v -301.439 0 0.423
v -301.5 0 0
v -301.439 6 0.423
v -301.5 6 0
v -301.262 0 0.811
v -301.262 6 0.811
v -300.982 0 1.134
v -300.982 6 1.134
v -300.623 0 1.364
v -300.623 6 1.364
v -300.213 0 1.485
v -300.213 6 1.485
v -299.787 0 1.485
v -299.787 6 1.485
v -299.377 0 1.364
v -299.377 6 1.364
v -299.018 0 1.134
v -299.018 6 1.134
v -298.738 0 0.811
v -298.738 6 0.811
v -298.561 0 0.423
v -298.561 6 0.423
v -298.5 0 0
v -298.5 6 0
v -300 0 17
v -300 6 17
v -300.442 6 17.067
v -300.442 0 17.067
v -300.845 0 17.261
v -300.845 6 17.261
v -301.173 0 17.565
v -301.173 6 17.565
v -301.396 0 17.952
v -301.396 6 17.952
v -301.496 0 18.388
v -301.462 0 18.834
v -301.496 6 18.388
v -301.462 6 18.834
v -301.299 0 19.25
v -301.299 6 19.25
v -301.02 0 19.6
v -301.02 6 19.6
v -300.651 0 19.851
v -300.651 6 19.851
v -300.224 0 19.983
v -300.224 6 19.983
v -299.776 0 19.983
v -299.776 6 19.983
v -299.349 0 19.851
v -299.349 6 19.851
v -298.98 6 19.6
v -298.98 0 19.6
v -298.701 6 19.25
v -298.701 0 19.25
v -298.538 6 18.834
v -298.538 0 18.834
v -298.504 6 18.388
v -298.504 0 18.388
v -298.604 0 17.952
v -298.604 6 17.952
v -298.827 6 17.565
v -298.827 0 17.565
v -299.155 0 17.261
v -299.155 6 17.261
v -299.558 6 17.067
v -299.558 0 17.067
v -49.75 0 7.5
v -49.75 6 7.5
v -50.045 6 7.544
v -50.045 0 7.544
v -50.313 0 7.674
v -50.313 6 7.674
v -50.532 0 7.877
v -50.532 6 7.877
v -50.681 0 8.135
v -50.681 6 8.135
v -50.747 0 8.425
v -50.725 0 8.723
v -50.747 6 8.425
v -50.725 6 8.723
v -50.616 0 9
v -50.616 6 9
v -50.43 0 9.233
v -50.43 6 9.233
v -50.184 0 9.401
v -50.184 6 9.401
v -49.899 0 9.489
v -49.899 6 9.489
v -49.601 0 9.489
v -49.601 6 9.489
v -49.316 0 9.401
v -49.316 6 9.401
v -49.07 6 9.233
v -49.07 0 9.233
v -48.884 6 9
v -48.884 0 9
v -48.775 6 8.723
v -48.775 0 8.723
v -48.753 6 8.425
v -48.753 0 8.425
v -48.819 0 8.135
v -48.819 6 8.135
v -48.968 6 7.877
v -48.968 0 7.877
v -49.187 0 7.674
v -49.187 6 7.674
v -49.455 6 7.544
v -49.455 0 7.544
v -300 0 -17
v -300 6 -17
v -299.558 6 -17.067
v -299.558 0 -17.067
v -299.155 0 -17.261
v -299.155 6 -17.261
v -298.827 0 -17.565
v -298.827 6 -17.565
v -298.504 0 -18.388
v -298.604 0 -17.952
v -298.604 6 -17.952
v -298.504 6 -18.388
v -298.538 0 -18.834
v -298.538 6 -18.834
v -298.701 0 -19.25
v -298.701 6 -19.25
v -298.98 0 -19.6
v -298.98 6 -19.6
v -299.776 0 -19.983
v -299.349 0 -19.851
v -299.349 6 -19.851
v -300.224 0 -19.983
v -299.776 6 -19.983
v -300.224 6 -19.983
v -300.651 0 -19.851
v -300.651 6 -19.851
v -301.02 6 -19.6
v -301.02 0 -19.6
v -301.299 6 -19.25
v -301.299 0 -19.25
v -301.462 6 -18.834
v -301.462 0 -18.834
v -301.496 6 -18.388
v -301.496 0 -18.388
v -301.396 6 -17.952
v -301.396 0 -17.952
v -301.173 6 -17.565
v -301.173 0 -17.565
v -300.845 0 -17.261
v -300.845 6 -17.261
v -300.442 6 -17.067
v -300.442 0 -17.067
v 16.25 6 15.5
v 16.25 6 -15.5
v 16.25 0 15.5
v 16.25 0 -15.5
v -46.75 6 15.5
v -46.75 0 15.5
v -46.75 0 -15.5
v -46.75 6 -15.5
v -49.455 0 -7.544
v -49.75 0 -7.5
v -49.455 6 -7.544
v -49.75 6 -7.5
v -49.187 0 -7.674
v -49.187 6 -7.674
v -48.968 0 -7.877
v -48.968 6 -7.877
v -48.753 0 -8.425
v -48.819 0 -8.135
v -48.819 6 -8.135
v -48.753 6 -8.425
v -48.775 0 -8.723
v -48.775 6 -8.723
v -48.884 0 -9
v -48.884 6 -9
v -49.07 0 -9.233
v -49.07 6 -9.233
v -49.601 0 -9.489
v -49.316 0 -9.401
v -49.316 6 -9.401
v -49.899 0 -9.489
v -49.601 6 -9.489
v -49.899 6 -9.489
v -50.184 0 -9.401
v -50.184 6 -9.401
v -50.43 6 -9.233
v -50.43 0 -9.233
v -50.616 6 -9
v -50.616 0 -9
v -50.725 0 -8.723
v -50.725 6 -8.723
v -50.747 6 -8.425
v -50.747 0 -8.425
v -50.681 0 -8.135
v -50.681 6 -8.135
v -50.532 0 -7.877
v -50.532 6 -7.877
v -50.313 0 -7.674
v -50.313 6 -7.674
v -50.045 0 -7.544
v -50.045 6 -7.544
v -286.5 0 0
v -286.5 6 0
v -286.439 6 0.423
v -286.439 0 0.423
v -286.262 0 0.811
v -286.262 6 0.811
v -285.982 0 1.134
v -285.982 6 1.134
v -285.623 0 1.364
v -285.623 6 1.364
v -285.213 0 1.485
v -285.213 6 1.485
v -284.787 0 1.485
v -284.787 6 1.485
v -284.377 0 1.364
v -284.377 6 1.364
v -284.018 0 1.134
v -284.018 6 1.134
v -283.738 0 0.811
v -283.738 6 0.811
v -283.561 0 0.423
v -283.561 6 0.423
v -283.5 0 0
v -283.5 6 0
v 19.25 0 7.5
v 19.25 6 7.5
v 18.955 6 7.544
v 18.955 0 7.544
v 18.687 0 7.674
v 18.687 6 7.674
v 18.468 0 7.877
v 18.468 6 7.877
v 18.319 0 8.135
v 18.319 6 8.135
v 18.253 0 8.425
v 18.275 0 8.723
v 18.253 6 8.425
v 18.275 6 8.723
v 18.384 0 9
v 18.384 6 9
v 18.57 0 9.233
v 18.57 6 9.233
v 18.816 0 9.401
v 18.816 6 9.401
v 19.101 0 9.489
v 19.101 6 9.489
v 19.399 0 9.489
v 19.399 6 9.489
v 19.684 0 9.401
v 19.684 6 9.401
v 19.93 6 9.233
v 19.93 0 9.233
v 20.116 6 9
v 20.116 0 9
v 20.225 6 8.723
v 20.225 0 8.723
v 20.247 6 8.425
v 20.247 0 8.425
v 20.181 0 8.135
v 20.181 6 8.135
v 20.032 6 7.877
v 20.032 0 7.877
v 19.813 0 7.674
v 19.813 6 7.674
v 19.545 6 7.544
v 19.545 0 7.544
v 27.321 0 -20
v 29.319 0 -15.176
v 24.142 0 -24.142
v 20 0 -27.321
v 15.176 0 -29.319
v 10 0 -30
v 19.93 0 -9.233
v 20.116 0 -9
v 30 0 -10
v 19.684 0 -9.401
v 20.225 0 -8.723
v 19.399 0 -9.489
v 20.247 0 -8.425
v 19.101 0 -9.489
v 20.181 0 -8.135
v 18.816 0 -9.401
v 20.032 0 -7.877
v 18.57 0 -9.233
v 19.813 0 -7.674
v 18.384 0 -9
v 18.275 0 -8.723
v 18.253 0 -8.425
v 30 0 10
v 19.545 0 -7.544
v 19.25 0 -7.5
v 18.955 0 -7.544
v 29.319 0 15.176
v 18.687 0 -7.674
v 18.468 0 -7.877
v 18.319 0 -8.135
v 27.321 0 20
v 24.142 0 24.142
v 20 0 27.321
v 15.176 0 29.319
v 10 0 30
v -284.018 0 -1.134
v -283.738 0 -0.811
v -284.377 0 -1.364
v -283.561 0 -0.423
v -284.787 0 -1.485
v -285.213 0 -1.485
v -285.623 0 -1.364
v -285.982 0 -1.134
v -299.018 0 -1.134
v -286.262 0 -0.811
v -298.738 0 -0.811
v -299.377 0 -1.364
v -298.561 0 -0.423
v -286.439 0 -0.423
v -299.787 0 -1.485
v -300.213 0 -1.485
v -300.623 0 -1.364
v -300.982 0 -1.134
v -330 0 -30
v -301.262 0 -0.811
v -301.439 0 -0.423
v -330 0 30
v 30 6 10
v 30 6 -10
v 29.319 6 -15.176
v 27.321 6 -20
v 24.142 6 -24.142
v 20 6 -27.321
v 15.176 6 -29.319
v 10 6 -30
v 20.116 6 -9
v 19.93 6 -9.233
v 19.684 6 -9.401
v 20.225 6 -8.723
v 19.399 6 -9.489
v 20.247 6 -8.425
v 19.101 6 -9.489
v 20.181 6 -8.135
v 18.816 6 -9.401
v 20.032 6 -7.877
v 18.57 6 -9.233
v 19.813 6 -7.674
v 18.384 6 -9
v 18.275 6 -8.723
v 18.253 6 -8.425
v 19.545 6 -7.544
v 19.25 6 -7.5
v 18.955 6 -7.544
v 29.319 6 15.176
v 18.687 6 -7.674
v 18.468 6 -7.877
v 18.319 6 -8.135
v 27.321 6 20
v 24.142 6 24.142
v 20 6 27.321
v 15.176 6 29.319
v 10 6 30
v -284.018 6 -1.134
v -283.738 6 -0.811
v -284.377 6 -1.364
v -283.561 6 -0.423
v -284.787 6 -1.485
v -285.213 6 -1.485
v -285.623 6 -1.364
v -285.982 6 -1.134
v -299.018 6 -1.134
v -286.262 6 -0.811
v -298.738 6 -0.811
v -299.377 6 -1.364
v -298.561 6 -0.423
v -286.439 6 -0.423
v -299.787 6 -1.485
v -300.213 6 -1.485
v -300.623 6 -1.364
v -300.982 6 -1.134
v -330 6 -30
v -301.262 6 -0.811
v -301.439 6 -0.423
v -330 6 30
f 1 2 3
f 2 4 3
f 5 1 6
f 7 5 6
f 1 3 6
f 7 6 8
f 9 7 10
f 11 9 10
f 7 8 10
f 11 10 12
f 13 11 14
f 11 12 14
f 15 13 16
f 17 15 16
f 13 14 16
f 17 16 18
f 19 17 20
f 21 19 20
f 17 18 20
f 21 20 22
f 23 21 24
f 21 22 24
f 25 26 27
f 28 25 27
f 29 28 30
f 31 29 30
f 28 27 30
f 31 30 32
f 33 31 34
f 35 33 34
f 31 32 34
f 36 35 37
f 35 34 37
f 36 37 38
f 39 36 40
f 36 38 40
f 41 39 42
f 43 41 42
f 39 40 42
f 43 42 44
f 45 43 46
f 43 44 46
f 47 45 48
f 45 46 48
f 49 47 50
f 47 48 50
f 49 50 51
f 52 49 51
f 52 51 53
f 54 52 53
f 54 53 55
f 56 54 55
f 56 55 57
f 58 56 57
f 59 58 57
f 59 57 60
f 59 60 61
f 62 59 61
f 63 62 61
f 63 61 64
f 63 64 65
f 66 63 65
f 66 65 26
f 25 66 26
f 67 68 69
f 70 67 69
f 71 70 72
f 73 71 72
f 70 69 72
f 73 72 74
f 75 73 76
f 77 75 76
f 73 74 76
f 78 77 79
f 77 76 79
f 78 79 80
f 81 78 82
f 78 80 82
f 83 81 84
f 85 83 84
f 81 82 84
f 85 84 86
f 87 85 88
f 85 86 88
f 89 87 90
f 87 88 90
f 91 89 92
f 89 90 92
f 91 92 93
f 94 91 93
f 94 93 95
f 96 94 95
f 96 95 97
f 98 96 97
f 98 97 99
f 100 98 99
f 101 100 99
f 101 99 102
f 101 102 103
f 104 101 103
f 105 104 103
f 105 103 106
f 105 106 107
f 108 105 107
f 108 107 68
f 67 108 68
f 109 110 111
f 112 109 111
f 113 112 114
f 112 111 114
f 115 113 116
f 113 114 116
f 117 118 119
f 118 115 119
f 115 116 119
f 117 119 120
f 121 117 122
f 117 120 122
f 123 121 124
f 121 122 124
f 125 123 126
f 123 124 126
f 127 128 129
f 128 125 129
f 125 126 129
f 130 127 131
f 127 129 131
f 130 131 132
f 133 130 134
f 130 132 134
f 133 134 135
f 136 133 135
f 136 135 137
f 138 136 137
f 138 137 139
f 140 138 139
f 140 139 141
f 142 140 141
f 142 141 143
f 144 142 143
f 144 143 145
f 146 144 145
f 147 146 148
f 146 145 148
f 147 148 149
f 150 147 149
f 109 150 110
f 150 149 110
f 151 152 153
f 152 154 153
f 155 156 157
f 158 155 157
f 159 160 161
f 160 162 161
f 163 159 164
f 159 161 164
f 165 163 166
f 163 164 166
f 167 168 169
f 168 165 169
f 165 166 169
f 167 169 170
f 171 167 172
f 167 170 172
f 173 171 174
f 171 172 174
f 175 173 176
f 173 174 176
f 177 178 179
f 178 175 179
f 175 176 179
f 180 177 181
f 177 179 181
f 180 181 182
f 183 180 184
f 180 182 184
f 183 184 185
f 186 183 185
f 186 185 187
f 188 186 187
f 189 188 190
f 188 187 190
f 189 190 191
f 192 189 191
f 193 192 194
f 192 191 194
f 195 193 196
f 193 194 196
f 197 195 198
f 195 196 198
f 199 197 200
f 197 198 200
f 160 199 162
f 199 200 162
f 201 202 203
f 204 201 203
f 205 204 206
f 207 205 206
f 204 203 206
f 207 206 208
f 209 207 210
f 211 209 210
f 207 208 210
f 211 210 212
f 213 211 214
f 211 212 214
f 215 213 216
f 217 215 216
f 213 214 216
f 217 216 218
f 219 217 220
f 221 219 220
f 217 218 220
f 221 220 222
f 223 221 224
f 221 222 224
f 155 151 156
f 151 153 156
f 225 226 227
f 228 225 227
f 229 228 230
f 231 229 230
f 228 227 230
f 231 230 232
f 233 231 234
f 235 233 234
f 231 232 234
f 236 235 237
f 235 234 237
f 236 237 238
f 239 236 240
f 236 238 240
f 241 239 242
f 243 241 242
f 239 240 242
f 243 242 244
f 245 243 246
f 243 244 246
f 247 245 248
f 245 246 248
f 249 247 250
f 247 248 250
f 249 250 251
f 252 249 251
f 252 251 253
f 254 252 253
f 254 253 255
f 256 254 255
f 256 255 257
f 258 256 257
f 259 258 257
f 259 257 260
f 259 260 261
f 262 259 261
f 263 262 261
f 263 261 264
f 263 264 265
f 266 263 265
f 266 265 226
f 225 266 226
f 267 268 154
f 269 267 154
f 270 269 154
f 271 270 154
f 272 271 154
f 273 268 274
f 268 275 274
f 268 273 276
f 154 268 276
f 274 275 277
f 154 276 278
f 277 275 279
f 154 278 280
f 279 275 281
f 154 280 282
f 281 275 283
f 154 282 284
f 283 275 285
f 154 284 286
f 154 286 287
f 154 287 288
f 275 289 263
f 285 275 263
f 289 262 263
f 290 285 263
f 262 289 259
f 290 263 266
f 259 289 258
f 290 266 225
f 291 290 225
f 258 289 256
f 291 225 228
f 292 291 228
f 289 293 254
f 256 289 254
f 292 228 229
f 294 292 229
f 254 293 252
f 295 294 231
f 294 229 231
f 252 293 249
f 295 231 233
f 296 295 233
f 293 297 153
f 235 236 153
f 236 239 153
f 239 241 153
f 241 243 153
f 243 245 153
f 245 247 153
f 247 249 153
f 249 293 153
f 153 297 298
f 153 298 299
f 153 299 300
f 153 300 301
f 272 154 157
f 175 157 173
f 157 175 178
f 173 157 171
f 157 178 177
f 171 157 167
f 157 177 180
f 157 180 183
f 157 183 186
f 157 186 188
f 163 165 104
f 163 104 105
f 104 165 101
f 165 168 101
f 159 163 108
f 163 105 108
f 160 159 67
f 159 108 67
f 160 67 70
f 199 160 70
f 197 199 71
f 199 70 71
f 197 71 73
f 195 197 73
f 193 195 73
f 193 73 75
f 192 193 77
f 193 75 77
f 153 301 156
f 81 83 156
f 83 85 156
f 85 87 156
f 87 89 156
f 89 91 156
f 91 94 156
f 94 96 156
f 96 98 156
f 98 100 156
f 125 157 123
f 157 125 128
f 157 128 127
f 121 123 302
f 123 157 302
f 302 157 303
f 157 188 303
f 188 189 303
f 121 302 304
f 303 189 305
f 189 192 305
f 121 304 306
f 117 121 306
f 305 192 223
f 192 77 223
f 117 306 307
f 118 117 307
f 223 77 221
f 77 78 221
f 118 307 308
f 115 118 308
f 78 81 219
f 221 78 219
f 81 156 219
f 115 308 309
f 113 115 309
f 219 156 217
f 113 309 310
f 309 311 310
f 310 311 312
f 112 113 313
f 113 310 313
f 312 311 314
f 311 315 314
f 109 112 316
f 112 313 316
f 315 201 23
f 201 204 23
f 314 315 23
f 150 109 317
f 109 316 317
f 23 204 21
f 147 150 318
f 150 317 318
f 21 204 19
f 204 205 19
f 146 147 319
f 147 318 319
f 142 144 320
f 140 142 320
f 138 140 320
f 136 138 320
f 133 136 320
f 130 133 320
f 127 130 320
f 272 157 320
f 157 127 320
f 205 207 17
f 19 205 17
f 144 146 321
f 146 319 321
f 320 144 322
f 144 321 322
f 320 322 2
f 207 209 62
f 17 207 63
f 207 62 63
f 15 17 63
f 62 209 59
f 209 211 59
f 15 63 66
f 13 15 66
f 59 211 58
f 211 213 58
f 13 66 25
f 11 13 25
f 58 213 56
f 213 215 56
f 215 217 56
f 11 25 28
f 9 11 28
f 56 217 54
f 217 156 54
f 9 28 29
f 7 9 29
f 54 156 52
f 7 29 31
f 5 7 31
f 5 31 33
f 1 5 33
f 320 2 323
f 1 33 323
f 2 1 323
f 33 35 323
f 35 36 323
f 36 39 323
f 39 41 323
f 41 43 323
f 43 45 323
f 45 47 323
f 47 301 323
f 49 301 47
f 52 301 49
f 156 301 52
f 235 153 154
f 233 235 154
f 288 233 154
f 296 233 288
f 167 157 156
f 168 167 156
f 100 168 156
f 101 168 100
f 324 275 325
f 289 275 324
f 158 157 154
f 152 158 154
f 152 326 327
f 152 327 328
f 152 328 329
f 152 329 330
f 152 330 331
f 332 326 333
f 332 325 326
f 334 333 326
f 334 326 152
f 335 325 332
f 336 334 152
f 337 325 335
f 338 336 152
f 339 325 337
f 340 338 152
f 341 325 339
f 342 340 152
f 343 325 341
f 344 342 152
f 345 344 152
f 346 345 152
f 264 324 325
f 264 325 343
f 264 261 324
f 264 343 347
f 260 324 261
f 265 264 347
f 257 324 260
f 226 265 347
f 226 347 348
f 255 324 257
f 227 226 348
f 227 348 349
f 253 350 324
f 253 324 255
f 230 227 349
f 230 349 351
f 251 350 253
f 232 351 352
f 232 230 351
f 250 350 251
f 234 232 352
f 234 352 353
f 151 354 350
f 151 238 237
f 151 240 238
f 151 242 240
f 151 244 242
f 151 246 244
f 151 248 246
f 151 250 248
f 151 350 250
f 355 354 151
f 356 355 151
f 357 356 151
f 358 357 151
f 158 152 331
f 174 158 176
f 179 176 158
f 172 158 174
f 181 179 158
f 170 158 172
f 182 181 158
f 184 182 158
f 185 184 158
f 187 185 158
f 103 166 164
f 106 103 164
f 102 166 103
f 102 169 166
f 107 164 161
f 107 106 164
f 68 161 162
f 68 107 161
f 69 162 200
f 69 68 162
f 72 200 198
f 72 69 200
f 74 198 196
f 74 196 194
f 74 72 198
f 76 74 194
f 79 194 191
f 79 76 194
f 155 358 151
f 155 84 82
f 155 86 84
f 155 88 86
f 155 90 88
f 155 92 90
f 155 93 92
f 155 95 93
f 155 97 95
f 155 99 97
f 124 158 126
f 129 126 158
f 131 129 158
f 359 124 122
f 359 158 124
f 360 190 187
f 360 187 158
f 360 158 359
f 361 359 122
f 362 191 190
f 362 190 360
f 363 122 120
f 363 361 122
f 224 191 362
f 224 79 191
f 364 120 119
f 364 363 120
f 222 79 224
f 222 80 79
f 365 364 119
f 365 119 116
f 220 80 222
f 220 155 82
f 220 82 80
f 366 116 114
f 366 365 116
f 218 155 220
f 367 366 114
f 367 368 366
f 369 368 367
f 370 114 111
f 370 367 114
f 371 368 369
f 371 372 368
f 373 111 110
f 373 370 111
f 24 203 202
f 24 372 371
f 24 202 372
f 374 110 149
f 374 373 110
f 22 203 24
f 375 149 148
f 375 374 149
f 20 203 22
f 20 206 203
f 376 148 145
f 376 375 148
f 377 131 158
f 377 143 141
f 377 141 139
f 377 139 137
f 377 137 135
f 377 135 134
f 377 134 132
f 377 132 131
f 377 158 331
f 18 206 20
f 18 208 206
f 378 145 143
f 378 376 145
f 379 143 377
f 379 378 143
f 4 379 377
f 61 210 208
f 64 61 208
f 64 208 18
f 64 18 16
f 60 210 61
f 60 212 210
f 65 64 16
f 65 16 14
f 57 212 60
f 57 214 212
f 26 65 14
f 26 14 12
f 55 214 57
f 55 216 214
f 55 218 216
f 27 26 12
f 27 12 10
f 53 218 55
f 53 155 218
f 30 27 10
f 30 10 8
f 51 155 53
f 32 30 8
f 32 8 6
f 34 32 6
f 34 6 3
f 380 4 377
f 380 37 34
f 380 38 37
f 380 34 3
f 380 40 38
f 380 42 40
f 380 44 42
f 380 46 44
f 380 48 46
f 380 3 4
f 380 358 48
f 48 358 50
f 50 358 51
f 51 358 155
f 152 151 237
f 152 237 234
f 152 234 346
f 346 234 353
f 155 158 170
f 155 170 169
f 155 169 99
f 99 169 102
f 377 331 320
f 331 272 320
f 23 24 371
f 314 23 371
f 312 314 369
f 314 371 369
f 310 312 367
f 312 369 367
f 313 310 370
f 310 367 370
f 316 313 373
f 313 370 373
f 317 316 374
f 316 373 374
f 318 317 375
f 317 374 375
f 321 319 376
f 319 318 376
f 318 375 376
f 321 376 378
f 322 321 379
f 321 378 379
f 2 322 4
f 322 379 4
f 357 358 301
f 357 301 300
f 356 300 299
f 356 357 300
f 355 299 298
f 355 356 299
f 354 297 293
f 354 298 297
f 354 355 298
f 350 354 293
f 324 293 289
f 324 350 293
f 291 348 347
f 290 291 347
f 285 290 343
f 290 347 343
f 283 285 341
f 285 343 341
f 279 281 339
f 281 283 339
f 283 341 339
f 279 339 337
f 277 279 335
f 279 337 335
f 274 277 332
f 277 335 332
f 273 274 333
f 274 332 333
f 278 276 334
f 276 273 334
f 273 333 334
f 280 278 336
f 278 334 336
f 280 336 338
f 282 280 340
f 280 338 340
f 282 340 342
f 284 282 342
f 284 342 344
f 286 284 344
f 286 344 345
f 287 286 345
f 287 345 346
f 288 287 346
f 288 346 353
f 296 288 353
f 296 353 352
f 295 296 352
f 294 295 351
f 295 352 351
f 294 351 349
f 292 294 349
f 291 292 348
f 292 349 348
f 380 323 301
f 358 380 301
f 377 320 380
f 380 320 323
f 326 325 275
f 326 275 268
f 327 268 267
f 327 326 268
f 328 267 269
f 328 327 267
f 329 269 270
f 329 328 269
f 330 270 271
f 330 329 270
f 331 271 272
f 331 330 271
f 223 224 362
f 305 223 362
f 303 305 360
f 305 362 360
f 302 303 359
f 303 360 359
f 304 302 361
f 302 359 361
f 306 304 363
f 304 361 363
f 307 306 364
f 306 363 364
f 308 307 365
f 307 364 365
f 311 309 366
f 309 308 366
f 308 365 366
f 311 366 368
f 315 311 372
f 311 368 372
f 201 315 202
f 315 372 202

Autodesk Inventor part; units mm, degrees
ref_plane "YZ Plane" through (0, 0, 0) normal (1, 0, 0) x (0, 1, 0)
ref_plane "XZ Plane" through (0, 0, 0) normal (0, 1, 0) x (-1, 0, 0)
ref_plane "XY Plane" through (0, 0, 0) normal (0, 0, 1) x (1, 0, 0)
sketch "Sketch1" plane through (0, 0, 0) normal (0, 1, 0) x (-1, 0, 0)
  line L0 (0, 0) -> (-16.25, 0)
  line L1 (0, 0) -> (46.75, 0)
  line L2 (300, 0) -> (330, 0)
  line L3 (330, 30) -> (-30, 30)
  line L4 (-16.25, 15.5) -> (46.75, 15.5)
  line L5 (46.75, 15.5) -> (46.75, 0)
  line L6 (46.75, -15.5) -> (-16.25, -15.5)
  line L7 (-16.25, -15.5) -> (-16.25, 0)
  line L8 (-16.25, 15.5) -> (46.75, -15.5) construction
  line L9 (46.75, 15.5) -> (-16.25, -15.5) construction
  line L10 (-19.25, 8.5) -> (49.75, 8.5) construction
  line L11 (49.75, 8.5) -> (49.75, -8.5) construction
  line L12 (49.75, -8.5) -> (-19.25, -8.5) construction
  line L13 (-19.25, -8.5) -> (-19.25, 8.5) construction
  line L14 (-19.25, 8.5) -> (49.75, -8.5) construction
  line L15 (49.75, 8.5) -> (-19.25, -8.5) construction
  line L16 (-30, 0) -> (-30, 30)
  line L17 (330, 0) -> (330, 30)
  line L18 (46.75, 0) -> (300, 0)
  line L19 (46.75, 0) -> (46.75, -15.5)
  line L20 (-16.25, 0) -> (-30, 0)
  line L21 (-16.25, 0) -> (-16.25, 15.5)
  line L22 (300, 0) -> (300, 18.5) construction
  line L23 (0, 0) -> (-30, 0) construction
  point P0 (15.25, 0)
  point P1 (15.25, 0)
  point P2 (285, 0)
  dimension "d0" = 300
  dimension "d5" = 63
  dimension "d6" = 31
  dimension "d7" = 69
  dimension "d8" = 17
  dimension "d9" = 16.25
  dimension "d10" = 30
  dimension "d11" = 30
  dimension "d20" = 18.5
  dimension "d21" = 15
extrude "Extrusion1" add sketch "Sketch1" along normal blind 6 contours L20 L16 L3 L17 L2 L18 L5 L4 L21
hole "Hole1" at (19.25, 0, 8.5) at (-49.75, 0, 8.5) direction (0, 1, 0) diameter 2 end through all
hole "Hole2" at (-300, 0, 0) at (-300, 0, 18.5) at (-285, 0, 0) direction (0, 1, 0) diameter 3 end through all
fillet "Fillet1" radius 20 1 edges at (30, 3, 30)
mirror "Mirror1" about plane through (-46.75, 0, 0) normal (0, 0, -1)
properties part number "segment1a" material "Plywood, Finish"
